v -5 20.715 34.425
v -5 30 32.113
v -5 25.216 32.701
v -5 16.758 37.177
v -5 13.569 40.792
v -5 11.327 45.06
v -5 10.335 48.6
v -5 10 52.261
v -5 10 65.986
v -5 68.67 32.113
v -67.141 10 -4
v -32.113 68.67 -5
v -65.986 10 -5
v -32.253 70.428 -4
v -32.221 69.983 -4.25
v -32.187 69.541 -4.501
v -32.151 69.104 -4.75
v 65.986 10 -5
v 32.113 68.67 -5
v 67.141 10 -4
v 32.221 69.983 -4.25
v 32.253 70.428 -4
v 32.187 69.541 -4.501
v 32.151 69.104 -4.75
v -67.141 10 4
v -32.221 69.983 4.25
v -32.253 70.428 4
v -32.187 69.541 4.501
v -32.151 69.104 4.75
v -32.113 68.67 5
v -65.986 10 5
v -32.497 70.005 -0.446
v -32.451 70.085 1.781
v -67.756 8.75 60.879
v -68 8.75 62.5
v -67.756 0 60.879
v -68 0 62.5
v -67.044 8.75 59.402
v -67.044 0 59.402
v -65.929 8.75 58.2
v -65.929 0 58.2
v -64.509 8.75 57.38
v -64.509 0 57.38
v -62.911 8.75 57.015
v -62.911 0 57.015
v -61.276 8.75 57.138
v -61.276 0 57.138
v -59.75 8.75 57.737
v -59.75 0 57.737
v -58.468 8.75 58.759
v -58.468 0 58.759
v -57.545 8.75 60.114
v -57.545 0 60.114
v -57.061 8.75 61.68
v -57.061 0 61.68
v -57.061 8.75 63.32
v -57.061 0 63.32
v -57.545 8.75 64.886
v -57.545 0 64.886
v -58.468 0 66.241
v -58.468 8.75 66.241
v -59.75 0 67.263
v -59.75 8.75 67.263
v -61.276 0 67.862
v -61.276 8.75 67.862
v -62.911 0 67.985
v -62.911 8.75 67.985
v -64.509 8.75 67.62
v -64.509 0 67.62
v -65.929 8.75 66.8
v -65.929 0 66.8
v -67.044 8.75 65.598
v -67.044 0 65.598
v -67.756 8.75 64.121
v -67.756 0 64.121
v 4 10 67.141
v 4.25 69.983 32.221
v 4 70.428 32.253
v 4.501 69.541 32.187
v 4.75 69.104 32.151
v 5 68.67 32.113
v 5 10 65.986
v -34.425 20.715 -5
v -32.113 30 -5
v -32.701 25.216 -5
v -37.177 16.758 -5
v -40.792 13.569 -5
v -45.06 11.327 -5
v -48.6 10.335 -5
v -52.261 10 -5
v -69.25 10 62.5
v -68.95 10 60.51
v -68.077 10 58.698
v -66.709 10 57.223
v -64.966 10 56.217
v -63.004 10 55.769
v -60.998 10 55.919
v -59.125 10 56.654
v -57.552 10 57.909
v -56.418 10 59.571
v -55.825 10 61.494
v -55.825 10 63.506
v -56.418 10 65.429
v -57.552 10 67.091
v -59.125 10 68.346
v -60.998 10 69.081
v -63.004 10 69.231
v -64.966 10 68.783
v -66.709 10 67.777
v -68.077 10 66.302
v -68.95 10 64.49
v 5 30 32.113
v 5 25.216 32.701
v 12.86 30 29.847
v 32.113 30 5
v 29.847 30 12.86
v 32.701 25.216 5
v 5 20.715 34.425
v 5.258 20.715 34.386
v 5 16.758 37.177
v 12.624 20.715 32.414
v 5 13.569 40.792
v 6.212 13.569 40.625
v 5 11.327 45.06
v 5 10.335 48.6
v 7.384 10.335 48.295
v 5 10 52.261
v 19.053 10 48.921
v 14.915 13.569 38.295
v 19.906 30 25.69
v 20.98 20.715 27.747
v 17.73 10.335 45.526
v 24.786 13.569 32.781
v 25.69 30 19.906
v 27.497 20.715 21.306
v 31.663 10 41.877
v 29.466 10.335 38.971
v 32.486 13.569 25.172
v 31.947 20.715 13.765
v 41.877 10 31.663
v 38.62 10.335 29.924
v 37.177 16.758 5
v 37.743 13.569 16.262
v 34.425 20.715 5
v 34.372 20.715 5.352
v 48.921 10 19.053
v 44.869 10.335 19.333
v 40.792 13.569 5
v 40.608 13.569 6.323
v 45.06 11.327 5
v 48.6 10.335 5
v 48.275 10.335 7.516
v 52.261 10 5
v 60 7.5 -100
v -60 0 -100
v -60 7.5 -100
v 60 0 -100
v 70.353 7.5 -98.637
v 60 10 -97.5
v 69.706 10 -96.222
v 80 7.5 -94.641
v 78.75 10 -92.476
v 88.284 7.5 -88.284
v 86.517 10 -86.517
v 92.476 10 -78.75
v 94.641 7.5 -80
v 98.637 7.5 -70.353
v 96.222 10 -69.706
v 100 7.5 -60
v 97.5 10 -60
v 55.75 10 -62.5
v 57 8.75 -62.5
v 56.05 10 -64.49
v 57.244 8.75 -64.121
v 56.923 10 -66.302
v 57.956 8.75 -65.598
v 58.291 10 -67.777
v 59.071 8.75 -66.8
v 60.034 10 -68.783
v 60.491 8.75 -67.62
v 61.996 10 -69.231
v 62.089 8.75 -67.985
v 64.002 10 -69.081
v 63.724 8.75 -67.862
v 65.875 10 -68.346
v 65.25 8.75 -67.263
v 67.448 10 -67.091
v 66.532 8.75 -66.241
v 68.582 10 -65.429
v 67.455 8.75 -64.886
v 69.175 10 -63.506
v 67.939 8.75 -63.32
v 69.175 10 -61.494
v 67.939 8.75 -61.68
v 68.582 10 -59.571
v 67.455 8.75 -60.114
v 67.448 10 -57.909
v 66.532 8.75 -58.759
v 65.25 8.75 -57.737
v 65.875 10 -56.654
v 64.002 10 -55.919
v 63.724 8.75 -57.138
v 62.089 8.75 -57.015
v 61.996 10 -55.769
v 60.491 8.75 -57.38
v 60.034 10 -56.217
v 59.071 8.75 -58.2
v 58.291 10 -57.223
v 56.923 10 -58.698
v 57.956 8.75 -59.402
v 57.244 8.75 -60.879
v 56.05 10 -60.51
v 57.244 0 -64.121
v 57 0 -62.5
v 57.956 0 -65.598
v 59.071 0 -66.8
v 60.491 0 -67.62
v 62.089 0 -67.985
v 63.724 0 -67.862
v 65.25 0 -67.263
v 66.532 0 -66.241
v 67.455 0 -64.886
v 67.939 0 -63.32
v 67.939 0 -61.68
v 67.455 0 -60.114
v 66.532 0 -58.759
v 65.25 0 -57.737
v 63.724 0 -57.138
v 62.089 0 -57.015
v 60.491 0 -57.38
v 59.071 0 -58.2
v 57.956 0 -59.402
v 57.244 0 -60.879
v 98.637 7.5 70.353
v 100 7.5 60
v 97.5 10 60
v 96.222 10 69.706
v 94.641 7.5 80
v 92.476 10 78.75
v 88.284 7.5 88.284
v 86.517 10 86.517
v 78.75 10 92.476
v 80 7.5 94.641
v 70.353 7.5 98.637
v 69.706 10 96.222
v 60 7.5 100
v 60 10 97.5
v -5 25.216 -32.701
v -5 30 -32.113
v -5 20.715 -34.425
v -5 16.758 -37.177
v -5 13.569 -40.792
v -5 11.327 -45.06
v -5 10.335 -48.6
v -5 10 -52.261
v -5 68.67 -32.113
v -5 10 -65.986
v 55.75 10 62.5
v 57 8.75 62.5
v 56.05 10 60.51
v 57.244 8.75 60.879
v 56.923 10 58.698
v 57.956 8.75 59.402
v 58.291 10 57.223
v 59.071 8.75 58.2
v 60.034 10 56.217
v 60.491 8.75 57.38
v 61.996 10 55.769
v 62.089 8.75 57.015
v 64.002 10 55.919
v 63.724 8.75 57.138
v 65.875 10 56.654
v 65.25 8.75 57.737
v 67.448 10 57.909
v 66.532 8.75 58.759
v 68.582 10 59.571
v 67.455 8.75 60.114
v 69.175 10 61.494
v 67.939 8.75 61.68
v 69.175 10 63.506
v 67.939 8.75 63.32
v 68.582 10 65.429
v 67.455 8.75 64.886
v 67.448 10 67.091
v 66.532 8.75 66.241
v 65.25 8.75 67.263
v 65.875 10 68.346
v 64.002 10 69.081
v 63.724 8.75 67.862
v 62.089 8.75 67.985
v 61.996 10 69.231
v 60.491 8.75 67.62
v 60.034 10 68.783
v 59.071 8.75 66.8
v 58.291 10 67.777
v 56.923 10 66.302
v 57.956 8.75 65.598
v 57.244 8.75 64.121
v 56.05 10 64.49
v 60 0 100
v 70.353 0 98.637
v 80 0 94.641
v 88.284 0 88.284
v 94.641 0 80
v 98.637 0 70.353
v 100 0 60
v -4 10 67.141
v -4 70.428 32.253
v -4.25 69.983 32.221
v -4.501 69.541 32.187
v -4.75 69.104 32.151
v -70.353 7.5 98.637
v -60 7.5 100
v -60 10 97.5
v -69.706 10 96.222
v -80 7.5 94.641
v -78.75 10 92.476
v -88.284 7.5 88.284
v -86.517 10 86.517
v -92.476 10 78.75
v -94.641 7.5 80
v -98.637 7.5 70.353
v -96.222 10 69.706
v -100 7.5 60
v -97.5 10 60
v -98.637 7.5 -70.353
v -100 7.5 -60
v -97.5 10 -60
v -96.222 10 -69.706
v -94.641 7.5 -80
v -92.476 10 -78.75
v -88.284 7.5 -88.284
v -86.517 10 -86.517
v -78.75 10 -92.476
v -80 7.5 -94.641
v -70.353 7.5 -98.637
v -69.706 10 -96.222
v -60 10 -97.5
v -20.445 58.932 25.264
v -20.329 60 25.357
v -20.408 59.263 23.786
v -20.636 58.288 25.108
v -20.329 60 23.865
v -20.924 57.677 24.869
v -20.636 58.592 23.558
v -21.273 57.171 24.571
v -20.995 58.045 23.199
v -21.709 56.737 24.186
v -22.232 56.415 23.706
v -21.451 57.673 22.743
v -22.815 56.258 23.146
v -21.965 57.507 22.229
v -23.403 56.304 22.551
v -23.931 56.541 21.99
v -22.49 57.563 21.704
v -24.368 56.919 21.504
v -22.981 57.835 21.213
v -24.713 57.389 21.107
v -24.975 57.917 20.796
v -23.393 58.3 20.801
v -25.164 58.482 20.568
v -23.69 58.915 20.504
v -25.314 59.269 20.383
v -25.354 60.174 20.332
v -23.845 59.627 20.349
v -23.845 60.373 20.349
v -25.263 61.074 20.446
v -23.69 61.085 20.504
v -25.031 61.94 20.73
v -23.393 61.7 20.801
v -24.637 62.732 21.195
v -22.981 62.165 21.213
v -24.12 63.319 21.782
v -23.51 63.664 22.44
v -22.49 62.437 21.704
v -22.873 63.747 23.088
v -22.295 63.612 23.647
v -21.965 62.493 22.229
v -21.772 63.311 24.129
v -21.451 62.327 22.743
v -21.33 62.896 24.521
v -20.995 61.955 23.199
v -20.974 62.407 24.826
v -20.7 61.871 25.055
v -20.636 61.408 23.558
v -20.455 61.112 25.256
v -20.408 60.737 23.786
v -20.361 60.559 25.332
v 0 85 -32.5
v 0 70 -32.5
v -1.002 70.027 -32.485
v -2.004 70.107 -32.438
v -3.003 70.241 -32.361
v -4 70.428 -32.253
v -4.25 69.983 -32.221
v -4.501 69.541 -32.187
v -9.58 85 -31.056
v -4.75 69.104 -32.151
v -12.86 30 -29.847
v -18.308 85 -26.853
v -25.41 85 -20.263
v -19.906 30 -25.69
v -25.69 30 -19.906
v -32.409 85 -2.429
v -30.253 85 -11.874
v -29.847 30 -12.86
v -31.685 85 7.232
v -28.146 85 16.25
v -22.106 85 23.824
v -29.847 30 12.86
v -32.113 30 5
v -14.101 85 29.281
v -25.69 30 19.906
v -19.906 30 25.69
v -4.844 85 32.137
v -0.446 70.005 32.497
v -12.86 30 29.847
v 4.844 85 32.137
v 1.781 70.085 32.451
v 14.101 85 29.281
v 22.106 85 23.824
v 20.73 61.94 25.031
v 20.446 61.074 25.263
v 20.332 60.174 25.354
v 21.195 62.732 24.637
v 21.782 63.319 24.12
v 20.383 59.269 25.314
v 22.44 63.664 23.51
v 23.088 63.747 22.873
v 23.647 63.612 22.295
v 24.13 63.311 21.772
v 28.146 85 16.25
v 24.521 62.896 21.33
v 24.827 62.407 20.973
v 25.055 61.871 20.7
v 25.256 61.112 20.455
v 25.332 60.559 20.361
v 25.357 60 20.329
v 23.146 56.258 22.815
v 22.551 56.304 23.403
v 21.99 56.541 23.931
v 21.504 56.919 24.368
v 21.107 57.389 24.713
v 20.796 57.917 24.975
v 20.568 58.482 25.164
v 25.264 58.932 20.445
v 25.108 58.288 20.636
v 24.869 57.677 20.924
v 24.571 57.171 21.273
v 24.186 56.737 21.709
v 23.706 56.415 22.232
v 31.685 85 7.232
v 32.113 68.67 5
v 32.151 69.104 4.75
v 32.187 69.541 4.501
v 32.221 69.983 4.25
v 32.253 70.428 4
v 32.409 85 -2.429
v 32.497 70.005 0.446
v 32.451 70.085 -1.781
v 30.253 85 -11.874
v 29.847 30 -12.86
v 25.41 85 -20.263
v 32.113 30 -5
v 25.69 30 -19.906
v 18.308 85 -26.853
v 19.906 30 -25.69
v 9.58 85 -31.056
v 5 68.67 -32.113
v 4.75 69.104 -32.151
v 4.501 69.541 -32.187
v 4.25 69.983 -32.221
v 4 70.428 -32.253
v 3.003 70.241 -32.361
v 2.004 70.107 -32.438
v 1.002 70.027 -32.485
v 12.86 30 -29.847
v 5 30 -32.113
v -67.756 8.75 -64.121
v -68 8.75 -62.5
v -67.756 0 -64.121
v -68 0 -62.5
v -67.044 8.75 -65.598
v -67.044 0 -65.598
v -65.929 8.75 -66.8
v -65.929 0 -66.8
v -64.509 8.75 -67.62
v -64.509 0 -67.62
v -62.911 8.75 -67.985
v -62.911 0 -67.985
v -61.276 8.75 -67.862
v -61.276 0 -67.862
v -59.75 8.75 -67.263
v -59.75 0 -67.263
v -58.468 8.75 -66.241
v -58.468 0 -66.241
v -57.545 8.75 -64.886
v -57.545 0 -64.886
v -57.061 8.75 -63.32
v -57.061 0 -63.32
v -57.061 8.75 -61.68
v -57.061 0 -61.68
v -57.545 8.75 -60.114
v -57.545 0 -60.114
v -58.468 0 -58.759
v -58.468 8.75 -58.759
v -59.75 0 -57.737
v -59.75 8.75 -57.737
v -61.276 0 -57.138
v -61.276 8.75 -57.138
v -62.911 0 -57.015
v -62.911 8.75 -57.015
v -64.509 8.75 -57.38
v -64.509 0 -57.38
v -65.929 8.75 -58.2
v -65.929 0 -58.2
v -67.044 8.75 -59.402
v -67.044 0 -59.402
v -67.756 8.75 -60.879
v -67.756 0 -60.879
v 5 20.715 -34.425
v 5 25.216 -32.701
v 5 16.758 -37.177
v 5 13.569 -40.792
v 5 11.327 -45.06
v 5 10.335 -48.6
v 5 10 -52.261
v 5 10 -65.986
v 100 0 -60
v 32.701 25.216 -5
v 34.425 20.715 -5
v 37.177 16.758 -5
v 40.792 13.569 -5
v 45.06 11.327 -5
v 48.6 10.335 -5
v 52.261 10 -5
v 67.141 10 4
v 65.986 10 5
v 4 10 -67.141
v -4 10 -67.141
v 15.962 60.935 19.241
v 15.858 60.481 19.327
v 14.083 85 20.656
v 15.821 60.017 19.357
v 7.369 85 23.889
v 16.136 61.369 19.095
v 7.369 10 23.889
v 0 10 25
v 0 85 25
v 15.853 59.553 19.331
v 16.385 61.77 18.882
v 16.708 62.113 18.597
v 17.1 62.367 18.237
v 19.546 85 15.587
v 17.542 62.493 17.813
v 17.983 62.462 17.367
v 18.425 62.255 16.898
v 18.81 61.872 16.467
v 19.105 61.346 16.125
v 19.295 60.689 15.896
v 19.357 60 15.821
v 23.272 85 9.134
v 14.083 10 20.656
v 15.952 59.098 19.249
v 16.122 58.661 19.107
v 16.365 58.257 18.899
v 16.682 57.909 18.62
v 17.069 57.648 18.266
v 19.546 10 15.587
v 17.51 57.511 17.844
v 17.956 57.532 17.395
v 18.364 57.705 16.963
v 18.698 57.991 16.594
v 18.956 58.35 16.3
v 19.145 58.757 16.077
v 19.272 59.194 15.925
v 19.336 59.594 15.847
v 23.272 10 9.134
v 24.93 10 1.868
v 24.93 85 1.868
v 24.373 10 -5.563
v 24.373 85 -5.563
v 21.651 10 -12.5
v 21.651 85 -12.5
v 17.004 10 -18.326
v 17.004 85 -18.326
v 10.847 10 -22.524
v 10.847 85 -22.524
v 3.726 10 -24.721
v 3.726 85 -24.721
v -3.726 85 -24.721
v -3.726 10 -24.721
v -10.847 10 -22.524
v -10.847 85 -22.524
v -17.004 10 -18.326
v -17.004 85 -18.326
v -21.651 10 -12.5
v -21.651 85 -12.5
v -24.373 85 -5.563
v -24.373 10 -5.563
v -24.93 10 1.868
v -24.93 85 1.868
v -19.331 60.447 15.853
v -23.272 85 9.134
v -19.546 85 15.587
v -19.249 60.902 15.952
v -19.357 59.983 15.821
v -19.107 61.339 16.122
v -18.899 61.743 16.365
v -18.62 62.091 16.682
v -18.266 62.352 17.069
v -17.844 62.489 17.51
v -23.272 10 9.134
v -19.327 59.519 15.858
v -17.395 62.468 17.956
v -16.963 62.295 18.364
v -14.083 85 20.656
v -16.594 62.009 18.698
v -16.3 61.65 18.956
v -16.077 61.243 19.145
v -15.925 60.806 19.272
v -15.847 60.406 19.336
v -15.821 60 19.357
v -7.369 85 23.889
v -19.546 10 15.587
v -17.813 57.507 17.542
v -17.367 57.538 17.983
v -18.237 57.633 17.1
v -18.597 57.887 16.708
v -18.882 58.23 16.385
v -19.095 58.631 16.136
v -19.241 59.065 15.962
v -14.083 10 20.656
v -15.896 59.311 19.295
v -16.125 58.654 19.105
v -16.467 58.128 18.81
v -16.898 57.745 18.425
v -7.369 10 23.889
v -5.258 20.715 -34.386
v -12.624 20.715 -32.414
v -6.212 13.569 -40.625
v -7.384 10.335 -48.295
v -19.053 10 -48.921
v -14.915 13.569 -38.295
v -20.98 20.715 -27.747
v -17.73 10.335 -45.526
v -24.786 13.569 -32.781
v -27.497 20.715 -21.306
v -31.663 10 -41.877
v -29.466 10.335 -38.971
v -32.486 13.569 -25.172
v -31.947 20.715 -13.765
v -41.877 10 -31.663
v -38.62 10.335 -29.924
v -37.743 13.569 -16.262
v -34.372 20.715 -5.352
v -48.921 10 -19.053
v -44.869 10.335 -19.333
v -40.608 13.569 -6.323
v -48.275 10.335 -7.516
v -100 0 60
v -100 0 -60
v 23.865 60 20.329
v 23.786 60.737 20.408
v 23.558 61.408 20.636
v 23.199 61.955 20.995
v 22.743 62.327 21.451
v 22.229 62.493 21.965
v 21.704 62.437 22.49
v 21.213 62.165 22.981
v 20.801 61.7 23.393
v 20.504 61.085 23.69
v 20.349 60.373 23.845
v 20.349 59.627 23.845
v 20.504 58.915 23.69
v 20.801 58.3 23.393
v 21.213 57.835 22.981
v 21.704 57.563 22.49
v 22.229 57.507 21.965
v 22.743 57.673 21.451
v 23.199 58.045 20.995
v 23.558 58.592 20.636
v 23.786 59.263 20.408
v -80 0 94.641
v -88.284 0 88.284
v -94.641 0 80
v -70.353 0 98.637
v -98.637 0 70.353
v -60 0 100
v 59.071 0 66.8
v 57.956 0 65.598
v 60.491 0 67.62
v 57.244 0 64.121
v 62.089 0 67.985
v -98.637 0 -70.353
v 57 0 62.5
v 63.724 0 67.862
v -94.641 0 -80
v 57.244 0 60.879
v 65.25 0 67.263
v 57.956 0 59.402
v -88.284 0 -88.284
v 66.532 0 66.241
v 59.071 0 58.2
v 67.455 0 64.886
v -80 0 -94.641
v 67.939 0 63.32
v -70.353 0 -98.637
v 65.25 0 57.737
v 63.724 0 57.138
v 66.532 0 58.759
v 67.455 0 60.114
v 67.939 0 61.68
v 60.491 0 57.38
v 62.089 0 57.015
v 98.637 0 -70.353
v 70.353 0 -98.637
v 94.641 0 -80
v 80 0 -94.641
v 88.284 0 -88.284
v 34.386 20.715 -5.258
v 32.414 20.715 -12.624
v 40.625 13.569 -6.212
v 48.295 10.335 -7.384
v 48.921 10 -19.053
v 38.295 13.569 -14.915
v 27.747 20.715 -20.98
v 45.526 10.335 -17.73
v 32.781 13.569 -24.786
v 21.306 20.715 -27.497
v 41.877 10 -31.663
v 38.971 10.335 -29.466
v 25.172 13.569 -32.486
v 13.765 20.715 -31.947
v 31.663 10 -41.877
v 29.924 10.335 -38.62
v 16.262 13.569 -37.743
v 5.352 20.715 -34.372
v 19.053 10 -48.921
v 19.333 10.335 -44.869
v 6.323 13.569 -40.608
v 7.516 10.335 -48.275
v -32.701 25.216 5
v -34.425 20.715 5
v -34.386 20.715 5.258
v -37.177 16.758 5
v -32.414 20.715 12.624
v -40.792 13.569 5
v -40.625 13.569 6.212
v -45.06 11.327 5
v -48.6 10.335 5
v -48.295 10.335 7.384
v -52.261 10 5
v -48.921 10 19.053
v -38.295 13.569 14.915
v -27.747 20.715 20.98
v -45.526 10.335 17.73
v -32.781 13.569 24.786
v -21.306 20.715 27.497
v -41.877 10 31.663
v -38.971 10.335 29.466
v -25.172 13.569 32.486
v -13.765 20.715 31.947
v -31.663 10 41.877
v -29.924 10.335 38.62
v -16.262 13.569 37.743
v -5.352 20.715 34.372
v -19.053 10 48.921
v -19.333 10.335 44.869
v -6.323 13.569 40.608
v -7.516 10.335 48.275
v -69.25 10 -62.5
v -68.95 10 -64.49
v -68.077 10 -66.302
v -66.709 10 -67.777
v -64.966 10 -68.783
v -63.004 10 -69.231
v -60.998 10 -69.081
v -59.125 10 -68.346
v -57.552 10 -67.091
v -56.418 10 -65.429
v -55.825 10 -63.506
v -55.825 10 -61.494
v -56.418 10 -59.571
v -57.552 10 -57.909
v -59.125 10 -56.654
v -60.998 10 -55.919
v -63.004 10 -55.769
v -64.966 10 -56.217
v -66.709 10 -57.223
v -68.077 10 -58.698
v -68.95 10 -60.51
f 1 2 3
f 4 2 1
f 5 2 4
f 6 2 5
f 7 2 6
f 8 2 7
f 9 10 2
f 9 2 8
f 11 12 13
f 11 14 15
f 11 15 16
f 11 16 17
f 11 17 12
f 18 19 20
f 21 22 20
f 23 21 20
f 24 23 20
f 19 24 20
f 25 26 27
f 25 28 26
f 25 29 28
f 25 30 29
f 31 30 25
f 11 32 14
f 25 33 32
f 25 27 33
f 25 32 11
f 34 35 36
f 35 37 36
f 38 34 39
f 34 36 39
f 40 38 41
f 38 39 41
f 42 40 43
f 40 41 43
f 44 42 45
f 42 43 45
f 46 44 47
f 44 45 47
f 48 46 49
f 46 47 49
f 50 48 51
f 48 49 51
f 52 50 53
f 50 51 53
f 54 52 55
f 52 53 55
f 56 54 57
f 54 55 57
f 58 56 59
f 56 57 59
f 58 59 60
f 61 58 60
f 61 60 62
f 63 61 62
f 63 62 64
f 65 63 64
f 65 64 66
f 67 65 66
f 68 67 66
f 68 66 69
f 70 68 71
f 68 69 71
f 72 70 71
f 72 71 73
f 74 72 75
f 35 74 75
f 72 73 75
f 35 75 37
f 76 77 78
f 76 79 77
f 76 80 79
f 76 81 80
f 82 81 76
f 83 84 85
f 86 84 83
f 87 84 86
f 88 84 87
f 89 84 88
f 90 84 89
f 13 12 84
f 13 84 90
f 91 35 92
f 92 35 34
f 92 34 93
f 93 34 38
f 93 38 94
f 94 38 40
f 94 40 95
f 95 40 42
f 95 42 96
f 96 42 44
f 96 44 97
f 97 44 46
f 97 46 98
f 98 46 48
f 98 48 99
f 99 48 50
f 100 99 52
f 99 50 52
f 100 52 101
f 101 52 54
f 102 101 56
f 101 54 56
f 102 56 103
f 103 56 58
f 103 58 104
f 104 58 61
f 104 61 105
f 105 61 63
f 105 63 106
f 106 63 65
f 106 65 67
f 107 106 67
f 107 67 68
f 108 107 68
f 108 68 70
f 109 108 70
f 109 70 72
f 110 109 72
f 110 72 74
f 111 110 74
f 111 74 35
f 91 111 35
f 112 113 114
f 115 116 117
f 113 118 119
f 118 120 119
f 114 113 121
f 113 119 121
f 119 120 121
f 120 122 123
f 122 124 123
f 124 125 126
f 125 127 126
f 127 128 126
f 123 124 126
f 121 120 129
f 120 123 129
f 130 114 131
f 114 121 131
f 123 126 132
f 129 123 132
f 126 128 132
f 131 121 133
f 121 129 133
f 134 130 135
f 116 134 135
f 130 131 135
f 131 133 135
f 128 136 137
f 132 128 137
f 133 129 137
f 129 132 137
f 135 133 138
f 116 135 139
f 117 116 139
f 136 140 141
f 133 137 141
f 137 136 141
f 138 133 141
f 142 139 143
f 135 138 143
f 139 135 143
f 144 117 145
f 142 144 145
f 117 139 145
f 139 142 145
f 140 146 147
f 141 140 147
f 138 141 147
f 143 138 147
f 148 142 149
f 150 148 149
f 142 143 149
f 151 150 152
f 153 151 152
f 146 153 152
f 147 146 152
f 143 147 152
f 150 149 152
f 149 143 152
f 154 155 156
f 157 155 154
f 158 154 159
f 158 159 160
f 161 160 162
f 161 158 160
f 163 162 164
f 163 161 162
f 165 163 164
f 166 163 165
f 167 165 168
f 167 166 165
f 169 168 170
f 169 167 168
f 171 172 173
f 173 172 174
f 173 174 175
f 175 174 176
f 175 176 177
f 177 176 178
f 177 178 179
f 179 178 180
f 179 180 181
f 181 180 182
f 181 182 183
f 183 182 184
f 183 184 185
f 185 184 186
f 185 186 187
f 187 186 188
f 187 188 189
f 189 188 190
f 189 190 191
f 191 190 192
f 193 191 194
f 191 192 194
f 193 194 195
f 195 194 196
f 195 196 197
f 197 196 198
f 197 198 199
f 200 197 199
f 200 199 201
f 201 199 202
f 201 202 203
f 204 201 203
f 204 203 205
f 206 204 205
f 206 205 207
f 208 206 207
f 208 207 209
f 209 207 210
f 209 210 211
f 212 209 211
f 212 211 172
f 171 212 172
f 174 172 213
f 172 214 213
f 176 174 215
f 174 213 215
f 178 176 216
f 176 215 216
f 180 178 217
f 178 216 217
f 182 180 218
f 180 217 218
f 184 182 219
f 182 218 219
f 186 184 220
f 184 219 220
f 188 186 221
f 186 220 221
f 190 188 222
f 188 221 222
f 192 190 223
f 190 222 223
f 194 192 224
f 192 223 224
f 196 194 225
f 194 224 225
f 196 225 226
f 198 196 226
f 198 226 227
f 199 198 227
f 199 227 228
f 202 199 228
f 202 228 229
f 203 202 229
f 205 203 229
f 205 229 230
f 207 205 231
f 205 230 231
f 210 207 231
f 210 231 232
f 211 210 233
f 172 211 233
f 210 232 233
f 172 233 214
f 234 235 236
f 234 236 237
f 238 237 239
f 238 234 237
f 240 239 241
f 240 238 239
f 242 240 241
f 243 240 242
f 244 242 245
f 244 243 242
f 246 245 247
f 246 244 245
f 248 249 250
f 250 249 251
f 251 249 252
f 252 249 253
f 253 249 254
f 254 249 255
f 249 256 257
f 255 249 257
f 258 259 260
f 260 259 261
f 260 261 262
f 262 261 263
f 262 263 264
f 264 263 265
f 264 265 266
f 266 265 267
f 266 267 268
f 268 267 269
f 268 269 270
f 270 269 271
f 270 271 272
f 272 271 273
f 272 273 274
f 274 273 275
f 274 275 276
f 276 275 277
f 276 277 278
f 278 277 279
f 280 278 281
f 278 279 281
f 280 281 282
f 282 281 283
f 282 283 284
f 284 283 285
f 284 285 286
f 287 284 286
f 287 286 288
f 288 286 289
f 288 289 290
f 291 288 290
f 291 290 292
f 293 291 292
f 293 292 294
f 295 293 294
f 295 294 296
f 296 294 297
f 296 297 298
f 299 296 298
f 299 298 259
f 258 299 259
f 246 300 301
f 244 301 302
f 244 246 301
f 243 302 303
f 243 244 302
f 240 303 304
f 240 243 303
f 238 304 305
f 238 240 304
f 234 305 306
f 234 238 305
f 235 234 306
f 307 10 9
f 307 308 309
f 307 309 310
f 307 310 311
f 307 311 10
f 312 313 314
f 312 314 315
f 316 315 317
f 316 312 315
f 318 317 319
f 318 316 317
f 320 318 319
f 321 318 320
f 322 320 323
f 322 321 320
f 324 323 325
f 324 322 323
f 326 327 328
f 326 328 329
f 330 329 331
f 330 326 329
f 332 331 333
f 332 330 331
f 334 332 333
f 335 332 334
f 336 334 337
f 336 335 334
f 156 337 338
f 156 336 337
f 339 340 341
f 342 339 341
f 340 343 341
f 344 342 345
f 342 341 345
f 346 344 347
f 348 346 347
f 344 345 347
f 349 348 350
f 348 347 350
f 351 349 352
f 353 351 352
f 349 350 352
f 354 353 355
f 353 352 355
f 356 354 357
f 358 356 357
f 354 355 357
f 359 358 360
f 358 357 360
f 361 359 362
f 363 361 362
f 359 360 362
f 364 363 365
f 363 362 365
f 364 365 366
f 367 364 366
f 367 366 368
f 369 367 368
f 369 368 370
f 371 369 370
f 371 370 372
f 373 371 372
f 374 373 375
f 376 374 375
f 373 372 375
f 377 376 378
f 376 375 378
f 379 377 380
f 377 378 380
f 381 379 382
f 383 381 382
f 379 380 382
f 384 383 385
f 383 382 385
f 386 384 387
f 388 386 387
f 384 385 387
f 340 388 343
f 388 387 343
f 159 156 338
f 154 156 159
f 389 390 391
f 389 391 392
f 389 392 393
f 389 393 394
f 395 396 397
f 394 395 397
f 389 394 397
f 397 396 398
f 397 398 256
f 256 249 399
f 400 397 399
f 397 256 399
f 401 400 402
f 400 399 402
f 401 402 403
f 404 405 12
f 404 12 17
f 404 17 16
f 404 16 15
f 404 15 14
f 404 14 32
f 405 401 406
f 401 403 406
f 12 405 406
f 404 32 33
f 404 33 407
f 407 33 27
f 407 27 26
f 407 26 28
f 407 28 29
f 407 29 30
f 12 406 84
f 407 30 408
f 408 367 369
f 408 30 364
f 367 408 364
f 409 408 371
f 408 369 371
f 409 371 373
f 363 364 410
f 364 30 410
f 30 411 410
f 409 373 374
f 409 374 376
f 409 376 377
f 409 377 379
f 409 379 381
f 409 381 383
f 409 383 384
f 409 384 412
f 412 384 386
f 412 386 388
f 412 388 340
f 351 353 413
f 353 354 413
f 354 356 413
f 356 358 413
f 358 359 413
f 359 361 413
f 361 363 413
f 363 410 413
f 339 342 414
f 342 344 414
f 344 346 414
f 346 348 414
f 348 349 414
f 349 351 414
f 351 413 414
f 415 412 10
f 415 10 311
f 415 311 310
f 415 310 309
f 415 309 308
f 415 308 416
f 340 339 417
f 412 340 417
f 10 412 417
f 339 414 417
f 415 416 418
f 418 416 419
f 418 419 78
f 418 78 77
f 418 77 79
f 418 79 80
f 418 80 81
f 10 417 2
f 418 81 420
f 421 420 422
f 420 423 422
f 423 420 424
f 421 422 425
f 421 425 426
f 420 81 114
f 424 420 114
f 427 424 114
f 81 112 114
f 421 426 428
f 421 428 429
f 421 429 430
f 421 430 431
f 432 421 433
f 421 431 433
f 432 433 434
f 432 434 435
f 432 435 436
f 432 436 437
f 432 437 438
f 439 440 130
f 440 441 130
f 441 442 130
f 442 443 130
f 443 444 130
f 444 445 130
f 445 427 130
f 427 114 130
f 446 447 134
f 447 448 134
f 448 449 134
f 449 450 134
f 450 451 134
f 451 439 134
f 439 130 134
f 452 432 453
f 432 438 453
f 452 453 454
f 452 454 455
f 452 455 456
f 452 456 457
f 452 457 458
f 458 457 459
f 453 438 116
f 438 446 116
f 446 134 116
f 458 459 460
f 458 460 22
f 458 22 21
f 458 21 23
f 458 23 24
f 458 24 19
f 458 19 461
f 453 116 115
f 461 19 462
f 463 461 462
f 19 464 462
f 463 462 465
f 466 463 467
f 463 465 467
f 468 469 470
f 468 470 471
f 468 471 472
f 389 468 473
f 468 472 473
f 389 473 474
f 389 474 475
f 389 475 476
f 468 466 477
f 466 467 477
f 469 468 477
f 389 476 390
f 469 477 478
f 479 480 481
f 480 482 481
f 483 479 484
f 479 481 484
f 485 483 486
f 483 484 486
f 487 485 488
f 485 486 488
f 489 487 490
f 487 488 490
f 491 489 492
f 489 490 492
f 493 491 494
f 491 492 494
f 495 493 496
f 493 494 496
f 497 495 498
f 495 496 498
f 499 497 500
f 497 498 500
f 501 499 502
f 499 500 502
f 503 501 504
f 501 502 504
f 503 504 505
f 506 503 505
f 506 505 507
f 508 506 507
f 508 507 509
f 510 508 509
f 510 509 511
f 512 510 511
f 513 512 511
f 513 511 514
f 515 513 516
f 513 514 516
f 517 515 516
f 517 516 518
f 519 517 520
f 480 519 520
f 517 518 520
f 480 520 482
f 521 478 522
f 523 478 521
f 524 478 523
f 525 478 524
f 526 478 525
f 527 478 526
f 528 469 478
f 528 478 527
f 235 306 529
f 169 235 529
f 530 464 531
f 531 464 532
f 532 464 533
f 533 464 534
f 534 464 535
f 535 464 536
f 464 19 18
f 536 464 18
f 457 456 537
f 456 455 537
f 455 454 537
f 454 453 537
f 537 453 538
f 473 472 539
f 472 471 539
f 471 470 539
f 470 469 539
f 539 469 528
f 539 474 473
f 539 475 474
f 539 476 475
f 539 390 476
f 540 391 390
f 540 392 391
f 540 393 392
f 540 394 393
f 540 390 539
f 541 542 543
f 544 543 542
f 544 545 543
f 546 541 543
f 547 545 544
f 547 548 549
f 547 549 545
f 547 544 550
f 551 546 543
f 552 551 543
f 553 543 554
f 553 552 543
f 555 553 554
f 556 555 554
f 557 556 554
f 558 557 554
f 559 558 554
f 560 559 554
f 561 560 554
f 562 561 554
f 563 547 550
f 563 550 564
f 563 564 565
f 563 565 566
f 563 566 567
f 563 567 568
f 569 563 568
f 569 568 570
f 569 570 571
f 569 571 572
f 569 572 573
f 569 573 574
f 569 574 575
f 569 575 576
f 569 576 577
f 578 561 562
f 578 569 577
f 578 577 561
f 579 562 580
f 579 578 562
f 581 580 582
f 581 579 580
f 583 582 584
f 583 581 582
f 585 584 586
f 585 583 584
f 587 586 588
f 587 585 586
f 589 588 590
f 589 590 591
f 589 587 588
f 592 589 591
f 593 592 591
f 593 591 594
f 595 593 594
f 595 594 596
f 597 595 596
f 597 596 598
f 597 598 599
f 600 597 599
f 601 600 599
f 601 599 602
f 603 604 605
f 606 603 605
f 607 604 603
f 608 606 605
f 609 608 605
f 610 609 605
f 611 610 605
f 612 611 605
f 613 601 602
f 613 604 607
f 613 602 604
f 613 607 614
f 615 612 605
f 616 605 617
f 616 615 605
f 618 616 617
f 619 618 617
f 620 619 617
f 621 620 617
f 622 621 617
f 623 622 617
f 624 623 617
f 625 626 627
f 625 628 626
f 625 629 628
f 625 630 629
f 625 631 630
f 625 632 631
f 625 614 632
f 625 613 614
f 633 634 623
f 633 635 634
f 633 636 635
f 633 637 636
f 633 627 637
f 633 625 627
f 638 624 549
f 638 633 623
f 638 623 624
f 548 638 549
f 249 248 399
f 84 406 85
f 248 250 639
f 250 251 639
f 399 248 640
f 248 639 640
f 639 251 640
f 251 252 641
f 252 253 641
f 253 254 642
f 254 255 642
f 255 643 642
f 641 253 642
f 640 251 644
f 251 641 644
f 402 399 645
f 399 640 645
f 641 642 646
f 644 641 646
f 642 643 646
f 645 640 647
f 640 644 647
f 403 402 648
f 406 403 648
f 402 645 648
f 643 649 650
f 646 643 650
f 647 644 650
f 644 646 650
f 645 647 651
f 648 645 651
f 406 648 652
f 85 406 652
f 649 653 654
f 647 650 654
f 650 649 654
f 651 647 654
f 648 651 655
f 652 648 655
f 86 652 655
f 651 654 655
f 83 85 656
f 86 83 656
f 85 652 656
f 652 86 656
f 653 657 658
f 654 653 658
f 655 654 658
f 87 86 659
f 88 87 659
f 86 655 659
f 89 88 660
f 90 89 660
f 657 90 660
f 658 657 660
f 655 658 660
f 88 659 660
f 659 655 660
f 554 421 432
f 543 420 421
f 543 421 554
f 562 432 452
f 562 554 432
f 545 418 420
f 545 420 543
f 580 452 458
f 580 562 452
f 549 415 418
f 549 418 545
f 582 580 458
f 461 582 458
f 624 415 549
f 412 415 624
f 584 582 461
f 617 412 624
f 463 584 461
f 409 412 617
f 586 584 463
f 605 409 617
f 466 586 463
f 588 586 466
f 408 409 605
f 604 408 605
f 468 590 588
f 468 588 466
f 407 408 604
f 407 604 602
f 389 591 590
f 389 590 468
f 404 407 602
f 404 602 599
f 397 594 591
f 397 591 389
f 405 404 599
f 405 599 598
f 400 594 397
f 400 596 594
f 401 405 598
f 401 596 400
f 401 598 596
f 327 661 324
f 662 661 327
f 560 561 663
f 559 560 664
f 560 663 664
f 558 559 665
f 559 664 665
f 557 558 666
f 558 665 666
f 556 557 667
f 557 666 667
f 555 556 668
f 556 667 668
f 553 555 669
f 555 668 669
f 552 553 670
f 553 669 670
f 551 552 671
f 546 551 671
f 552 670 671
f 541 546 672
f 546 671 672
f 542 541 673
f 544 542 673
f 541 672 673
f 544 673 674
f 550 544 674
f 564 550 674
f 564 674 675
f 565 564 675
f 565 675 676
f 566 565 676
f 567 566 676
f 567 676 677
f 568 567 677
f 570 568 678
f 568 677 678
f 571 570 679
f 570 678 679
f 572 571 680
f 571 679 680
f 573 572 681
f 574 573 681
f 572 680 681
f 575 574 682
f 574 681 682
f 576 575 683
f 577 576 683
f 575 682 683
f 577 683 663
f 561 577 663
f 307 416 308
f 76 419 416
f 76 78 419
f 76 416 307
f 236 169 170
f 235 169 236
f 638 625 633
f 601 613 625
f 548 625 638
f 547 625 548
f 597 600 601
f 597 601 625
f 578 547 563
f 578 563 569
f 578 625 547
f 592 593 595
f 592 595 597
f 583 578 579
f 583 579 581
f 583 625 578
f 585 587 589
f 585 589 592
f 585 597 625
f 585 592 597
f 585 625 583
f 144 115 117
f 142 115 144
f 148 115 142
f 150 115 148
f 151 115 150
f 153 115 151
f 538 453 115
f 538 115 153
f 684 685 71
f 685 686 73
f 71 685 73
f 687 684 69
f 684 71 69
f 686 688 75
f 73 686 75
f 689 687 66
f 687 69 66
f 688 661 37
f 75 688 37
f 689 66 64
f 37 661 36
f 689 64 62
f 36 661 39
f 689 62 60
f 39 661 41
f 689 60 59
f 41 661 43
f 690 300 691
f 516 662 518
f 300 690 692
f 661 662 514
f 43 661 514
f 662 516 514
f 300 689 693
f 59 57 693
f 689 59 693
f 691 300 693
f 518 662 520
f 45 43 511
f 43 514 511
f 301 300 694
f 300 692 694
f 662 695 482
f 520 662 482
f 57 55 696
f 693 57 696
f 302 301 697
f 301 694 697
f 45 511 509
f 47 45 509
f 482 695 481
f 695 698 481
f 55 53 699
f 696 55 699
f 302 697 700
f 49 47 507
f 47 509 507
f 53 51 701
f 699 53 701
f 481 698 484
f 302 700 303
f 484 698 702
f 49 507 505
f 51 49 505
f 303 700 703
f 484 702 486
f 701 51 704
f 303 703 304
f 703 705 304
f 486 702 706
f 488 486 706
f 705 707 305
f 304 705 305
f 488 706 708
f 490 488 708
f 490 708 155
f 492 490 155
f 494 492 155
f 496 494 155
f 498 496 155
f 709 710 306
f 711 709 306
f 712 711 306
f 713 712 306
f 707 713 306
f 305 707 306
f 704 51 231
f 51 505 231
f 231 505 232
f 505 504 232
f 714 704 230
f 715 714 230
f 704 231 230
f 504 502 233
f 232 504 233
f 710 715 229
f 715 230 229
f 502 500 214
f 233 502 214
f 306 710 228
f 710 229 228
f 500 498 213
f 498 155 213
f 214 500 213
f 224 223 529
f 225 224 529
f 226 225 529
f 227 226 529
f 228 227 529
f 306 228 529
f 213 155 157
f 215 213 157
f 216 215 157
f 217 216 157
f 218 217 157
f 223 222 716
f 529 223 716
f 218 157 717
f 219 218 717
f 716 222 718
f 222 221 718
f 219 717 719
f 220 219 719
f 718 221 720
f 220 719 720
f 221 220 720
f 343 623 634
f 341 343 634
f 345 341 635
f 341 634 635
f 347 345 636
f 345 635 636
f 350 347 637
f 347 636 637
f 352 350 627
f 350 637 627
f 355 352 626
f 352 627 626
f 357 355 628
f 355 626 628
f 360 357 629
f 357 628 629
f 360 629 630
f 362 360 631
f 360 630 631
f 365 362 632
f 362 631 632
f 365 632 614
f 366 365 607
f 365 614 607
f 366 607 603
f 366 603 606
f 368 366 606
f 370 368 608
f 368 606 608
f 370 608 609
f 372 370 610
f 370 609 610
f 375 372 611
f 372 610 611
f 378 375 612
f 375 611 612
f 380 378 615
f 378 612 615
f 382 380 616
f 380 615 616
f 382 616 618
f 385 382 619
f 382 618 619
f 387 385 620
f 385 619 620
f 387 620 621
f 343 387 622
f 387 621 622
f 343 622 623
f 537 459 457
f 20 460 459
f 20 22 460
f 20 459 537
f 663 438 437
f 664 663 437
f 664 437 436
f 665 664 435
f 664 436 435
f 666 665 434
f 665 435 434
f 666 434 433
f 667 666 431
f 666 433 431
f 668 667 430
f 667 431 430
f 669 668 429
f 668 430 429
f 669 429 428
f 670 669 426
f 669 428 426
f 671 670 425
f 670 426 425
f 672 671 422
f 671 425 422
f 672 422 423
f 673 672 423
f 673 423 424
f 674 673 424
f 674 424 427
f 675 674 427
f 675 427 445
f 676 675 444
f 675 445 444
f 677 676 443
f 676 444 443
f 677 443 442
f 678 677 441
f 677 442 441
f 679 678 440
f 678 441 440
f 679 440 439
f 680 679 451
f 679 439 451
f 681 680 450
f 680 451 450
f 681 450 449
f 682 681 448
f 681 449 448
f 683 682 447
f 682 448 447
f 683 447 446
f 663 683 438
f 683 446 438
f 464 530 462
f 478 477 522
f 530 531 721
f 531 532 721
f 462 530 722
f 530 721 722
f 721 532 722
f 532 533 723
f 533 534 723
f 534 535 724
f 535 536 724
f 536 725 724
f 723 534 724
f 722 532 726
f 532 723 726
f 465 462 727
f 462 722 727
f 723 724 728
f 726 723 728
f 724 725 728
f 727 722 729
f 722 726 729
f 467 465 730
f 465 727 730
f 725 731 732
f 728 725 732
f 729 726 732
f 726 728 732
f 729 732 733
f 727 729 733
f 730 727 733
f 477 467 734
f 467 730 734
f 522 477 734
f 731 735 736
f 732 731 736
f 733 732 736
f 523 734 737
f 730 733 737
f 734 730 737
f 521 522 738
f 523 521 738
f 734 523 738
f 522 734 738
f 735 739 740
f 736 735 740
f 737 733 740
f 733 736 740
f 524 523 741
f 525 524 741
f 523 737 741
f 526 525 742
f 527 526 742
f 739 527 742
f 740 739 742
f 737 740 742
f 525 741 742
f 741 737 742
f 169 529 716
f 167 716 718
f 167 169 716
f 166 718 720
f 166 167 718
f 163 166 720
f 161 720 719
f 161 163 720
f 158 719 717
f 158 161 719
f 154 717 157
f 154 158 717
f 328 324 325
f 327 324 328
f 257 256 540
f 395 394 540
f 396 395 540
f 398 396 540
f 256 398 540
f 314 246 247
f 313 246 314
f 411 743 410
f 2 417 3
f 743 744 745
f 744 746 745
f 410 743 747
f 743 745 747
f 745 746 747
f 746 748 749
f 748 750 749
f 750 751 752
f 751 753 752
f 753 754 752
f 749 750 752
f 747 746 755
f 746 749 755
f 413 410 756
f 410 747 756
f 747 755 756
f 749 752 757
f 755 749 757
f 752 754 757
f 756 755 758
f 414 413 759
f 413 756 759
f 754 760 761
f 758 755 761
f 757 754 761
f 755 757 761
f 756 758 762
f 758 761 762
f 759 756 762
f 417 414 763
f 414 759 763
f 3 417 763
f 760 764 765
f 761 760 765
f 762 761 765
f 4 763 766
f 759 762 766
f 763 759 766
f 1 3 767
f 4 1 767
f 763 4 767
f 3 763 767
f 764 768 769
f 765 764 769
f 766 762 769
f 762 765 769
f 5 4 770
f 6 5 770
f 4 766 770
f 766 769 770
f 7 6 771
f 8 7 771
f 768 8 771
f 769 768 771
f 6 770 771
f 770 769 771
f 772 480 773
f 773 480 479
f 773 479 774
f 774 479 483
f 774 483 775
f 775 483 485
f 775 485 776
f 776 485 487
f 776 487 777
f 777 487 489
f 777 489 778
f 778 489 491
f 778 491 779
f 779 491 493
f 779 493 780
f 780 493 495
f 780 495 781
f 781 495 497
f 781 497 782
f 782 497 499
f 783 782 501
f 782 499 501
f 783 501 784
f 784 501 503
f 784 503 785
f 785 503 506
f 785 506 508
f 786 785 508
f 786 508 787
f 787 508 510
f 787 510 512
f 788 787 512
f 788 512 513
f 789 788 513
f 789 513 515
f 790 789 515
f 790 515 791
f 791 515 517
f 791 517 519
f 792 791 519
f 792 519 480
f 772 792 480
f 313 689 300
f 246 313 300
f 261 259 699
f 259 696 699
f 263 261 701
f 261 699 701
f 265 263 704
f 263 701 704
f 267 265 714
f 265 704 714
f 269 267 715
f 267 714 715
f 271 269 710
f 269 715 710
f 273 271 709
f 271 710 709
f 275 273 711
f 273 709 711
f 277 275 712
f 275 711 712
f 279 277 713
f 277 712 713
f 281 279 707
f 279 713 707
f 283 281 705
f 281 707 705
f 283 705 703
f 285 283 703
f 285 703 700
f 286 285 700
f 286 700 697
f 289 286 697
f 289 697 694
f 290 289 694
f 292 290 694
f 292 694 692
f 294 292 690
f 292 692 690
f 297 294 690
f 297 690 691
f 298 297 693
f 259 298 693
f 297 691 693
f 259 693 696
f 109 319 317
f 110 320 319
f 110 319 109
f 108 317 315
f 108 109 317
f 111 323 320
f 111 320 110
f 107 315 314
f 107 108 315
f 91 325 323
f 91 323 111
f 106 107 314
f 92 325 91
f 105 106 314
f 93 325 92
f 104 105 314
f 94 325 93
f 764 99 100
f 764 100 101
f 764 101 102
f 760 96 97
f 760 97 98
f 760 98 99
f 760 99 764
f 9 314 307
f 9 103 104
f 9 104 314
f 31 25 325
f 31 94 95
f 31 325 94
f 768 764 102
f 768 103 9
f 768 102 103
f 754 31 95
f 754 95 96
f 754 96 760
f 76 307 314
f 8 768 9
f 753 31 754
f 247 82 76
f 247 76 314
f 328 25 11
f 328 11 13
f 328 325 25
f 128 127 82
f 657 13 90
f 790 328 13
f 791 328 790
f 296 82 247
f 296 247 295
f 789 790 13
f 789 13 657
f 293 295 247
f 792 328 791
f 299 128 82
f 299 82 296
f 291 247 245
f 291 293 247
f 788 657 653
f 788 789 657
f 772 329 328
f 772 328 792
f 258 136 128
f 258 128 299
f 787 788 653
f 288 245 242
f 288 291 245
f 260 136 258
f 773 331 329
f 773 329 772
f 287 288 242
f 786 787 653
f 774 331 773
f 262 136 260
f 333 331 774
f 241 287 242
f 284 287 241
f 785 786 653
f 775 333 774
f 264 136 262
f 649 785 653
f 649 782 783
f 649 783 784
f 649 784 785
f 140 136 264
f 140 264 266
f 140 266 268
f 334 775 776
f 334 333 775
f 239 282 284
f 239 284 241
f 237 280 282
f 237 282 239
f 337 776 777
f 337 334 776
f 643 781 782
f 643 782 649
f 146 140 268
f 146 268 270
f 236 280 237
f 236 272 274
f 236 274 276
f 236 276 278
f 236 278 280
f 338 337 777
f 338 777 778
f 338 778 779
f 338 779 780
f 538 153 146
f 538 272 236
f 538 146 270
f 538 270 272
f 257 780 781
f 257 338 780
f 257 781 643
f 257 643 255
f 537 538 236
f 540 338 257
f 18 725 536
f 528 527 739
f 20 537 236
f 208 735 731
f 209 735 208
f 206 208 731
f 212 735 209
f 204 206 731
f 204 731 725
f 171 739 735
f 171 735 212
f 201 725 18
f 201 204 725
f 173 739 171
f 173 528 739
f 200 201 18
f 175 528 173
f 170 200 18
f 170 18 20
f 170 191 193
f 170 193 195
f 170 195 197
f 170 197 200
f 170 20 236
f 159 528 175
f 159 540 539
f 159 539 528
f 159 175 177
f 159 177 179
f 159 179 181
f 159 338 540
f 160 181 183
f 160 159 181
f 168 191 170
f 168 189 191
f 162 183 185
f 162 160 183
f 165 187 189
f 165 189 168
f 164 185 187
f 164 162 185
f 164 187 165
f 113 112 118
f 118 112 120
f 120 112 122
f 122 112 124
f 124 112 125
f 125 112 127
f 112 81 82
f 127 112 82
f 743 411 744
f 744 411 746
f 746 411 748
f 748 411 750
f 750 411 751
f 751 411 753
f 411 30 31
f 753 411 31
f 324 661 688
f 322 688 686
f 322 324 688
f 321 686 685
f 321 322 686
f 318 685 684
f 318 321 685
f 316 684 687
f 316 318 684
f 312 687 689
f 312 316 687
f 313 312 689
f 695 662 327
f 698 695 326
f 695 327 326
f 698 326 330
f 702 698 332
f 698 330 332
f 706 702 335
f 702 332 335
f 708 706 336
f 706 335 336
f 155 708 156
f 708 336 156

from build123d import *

# Parameters (mm, degrees)
SKETCH1_W                  = 200
SKETCH1_H                  = 200
BOSS_EXTRUDE1_DEPTH        = 10
SKETCH2_R                  = 32.5
SKETCH2_R_2                = 25
BOSS_EXTRUDE2_DEPTH        = 75
RIB1_REACH                 = 167
SKETCH3_WALL_W             = 401.282032302
SKETCH3_WALL_H             = 10
CIRPATTERN1_COUNT          = 4
MOUNTING_HOLES_D           = 11
MOUNTING_HOLES_CSINK_D     = 13.5
MOUNTING_HOLES_CSINK_ANGLE = 90
FILLET1_R                  = 20
FILLET2_R                  = 40
CHAMFER1_SIZE              = 2.5
CHAMFER2_SIZE              = 1


# Read off the part's stored shape, not the designer's step: M6x1.0 Tapped Hole1, M6x1.0 Tapped Hole2
with BuildPart() as part:
    # Sketch1 → Boss-Extrude1 (new body)
    with BuildSketch(Plane(origin=(0, 0, 0), x_dir=(1, 0, 0), z_dir=(0, 1, 0))):
        Rectangle(SKETCH1_W, SKETCH1_H)
    extrude(amount=BOSS_EXTRUDE1_DEPTH)

    # Sketch2 → Boss-Extrude2 (add)
    with BuildSketch(Plane(origin=(0, 10, 0), x_dir=(1, 0, 0), z_dir=(0, 1, 0))):
        with Locations(Location((0, 0, 0), (0, 0, 90))):
            Circle(SKETCH2_R)
        with Locations(Location((0, 0, 0), (0, 0, 270))):
            Circle(SKETCH2_R_2, mode=Mode.SUBTRACT)
    extrude(amount=BOSS_EXTRUDE2_DEPTH)

    # Sketch3 wall → Rib1 (add, up to next)
    with BuildSketch(Plane(origin=(49.820508076, 40, 0), x_dir=(0.499999999996, -0.866025403787, 0), z_dir=(0.866025403787, 0.499999999996, 0)), mode=Mode.PRIVATE) as rib1_sk1:
        Rectangle(SKETCH3_WALL_W, SKETCH3_WALL_H)
    rib1_tool1 = extrude(rib1_sk1.sketch, amount=-RIB1_REACH, mode=Mode.PRIVATE) - part.part
    rib1 = rib1_tool1.solids().sort_by_distance((49.820508076, 40, 0))[0]
    add(rib1)

    # CirPattern1: Rib1 ×4 about axis
    cirpattern1_axis = Axis((0, 0, 0), (0, 1, 0))
    for i in range(1, CIRPATTERN1_COUNT):
        add(rib1.rotate(cirpattern1_axis, i * 360 / CIRPATTERN1_COUNT))

    # M6x1.0 Tapped Hole1 outline → M6x1.0 Tapped Hole1 (revolve, cut)
    with BuildSketch(Plane(origin=(0, 60, 0), x_dir=(0.707106781186546, 0, 0.707106781186549), z_dir=(0, 1, 0))):
        Polygon((0, -32.500112934), (3.750112934, -32.500112934), (2.5, -31.25), (2.5, -24.874618187), (0, -24.874618187), align=None)
    revolve(axis=Axis((0, 60, 0), (0.707106781186549, 0, -0.707106781186546)), mode=Mode.SUBTRACT)

    # M6x1.0 Tapped Hole2 outline → M6x1.0 Tapped Hole2 (revolve, cut)
    with BuildSketch(Plane(origin=(0, 60, 0), x_dir=(0.707106781186546, 0, -0.707106781186549), z_dir=(0, -1, 0))):
        Polygon((3.750104401, 32.500104401), (0, 32.500104401), (0, 24.874618187), (2.5, 24.874618187), (2.5, 31.25), align=None)
    revolve(axis=Axis((0, 60, 0), (0.707106781186549, 0, 0.707106781186546)), mode=Mode.SUBTRACT)

    # Mounting Holes (through all)
    with Locations(Plane(origin=(0, 10, 0), x_dir=(1, 0, 0), z_dir=(0, 1, 0))):
        with Locations((-62.5, 62.5), (62.5, 62.5), (62.5, -62.5), (-62.5, -62.5)):
            CounterSinkHole(MOUNTING_HOLES_D / 2, MOUNTING_HOLES_CSINK_D / 2, counter_sink_angle=MOUNTING_HOLES_CSINK_ANGLE)

    # Fillet1
    fillet1_edges = [part.edges().sort_by_distance(p)[0] for p in [
        (-22.980970389, 10, -22.980970389),
        (22.980970389, 10, -22.980970389),
        (22.980970389, 10, 22.980970389),
        (-22.980970389, 10, 22.980970389),
    ]]
    fillet(fillet1_edges, radius=FILLET1_R)

    # Fillet2
    fillet2_edges = [part.edges().sort_by_distance(p)[0] for p in [
        (100, 5, 100),
        (-100, 5, 100),
        (-100, 5, -100),
        (100, 5, -100),
    ]]
    fillet(fillet2_edges, radius=FILLET2_R)

    # Chamfer1
    chamfer1_edges = [part.edges().sort_by_distance(p)[0] for p in [
        (-100, 10, 0),
        (0, 10, -100),
        (0, 10, 100),
        (100, 10, 0),
        (-88.284271247, 10, 88.284271247),
        (88.284271247, 10, 88.284271247),
        (88.284271247, 10, -88.284271247),
        (-88.284271247, 10, -88.284271247),
    ]]
    chamfer(chamfer1_edges, length=CHAMFER1_SIZE)

    # Chamfer2
    chamfer2_edges = [part.edges().sort_by_distance(p)[0] for p in [
        (-49.627048799, 40.335081297, -5),
        (-49.627048799, 40.335081297, 5),
        (-5, 40.335081297, 49.627048799),
        (5, 40.335081297, 49.627048799),
        (49.627048799, 40.335081297, 5),
        (49.627048799, 40.335081297, -5),
        (-5, 40.335081297, -49.627048799),
        (5, 40.335081297, -49.627048799),
    ]]
    chamfer(chamfer2_edges, length=CHAMFER2_SIZE)


solid = part.part
